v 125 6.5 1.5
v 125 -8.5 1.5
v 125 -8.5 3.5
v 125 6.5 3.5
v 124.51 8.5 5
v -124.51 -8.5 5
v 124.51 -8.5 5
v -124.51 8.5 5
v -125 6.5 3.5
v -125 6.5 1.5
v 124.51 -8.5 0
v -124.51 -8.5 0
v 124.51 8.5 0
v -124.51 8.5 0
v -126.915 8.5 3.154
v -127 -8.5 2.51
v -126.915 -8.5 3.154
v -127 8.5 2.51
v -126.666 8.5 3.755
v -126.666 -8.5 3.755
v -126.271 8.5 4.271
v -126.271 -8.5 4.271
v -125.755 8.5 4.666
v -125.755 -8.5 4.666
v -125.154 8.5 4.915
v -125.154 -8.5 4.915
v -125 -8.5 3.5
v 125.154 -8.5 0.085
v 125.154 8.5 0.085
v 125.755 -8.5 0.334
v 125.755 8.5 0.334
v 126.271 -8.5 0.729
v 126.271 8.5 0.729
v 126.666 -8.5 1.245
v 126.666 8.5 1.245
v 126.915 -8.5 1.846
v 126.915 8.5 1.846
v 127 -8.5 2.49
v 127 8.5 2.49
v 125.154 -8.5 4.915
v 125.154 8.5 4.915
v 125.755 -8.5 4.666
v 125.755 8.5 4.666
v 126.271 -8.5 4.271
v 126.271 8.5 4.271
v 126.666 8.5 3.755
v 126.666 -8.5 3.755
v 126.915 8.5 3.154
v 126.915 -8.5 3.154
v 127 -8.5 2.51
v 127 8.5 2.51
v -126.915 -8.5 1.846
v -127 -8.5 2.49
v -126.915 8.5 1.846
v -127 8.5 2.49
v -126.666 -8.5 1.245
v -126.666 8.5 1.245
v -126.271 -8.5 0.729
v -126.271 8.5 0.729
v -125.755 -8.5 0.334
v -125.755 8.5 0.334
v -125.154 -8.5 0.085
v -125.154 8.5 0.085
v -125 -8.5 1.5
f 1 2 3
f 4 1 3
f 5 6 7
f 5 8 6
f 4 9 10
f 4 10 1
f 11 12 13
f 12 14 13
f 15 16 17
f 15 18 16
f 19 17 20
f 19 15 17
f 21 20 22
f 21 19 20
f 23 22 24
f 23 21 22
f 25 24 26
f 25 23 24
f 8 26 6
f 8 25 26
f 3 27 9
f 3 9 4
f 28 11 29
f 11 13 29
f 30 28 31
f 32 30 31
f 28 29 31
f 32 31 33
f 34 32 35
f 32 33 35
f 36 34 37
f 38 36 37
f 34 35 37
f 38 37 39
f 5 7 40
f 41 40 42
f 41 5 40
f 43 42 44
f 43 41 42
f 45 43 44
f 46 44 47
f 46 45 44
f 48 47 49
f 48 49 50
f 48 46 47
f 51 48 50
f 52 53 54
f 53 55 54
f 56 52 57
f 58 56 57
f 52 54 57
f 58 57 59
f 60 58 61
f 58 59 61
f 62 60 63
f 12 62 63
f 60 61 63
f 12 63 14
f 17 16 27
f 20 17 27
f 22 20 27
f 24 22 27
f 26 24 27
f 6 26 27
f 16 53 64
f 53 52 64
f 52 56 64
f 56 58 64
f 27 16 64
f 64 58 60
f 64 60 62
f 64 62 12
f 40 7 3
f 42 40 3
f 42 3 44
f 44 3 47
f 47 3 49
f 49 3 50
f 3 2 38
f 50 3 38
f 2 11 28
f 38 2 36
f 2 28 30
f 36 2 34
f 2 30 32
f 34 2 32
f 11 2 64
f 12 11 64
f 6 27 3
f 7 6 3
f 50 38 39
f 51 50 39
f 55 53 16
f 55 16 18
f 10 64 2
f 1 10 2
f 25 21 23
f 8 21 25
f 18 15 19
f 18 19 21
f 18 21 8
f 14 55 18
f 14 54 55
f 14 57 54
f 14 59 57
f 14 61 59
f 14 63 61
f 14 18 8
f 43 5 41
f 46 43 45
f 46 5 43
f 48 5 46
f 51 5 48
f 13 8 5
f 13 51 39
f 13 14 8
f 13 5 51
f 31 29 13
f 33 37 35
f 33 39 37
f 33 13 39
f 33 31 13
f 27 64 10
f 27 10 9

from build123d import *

# Parameters (mm, degrees)
SKETCH_W     = 254
SKETCH_H     = 17
PAD_DEPTH    = 5
SKETCH001_W  = 250
SKETCH001_H  = 2
POCKET_DEPTH = 15
FILLET_R     = 2.49


with BuildPart() as part:
    # Sketch → Pad (new body)
    with BuildSketch(Plane.XY):
        Rectangle(SKETCH_W, SKETCH_H)
    extrude(amount=PAD_DEPTH)

    # Sketch001 (on Face2 of Pad) → Pocket (cut)
    with BuildSketch(Plane.XZ.offset(8.5)):
        with Locations((0, 2.5)):
            Rectangle(SKETCH001_W, SKETCH001_H)
    extrude(amount=-POCKET_DEPTH, mode=Mode.SUBTRACT)

    # Fillet
    fillet_edges = [part.edges().sort_by_distance(p)[0] for p in [
        (127, 0, 5),
        (127, 0, 0),
        (-127, 0, 0),
        (-127, 0, 5),
    ]]
    fillet(fillet_edges, radius=FILLET_R)


solid = part.part
